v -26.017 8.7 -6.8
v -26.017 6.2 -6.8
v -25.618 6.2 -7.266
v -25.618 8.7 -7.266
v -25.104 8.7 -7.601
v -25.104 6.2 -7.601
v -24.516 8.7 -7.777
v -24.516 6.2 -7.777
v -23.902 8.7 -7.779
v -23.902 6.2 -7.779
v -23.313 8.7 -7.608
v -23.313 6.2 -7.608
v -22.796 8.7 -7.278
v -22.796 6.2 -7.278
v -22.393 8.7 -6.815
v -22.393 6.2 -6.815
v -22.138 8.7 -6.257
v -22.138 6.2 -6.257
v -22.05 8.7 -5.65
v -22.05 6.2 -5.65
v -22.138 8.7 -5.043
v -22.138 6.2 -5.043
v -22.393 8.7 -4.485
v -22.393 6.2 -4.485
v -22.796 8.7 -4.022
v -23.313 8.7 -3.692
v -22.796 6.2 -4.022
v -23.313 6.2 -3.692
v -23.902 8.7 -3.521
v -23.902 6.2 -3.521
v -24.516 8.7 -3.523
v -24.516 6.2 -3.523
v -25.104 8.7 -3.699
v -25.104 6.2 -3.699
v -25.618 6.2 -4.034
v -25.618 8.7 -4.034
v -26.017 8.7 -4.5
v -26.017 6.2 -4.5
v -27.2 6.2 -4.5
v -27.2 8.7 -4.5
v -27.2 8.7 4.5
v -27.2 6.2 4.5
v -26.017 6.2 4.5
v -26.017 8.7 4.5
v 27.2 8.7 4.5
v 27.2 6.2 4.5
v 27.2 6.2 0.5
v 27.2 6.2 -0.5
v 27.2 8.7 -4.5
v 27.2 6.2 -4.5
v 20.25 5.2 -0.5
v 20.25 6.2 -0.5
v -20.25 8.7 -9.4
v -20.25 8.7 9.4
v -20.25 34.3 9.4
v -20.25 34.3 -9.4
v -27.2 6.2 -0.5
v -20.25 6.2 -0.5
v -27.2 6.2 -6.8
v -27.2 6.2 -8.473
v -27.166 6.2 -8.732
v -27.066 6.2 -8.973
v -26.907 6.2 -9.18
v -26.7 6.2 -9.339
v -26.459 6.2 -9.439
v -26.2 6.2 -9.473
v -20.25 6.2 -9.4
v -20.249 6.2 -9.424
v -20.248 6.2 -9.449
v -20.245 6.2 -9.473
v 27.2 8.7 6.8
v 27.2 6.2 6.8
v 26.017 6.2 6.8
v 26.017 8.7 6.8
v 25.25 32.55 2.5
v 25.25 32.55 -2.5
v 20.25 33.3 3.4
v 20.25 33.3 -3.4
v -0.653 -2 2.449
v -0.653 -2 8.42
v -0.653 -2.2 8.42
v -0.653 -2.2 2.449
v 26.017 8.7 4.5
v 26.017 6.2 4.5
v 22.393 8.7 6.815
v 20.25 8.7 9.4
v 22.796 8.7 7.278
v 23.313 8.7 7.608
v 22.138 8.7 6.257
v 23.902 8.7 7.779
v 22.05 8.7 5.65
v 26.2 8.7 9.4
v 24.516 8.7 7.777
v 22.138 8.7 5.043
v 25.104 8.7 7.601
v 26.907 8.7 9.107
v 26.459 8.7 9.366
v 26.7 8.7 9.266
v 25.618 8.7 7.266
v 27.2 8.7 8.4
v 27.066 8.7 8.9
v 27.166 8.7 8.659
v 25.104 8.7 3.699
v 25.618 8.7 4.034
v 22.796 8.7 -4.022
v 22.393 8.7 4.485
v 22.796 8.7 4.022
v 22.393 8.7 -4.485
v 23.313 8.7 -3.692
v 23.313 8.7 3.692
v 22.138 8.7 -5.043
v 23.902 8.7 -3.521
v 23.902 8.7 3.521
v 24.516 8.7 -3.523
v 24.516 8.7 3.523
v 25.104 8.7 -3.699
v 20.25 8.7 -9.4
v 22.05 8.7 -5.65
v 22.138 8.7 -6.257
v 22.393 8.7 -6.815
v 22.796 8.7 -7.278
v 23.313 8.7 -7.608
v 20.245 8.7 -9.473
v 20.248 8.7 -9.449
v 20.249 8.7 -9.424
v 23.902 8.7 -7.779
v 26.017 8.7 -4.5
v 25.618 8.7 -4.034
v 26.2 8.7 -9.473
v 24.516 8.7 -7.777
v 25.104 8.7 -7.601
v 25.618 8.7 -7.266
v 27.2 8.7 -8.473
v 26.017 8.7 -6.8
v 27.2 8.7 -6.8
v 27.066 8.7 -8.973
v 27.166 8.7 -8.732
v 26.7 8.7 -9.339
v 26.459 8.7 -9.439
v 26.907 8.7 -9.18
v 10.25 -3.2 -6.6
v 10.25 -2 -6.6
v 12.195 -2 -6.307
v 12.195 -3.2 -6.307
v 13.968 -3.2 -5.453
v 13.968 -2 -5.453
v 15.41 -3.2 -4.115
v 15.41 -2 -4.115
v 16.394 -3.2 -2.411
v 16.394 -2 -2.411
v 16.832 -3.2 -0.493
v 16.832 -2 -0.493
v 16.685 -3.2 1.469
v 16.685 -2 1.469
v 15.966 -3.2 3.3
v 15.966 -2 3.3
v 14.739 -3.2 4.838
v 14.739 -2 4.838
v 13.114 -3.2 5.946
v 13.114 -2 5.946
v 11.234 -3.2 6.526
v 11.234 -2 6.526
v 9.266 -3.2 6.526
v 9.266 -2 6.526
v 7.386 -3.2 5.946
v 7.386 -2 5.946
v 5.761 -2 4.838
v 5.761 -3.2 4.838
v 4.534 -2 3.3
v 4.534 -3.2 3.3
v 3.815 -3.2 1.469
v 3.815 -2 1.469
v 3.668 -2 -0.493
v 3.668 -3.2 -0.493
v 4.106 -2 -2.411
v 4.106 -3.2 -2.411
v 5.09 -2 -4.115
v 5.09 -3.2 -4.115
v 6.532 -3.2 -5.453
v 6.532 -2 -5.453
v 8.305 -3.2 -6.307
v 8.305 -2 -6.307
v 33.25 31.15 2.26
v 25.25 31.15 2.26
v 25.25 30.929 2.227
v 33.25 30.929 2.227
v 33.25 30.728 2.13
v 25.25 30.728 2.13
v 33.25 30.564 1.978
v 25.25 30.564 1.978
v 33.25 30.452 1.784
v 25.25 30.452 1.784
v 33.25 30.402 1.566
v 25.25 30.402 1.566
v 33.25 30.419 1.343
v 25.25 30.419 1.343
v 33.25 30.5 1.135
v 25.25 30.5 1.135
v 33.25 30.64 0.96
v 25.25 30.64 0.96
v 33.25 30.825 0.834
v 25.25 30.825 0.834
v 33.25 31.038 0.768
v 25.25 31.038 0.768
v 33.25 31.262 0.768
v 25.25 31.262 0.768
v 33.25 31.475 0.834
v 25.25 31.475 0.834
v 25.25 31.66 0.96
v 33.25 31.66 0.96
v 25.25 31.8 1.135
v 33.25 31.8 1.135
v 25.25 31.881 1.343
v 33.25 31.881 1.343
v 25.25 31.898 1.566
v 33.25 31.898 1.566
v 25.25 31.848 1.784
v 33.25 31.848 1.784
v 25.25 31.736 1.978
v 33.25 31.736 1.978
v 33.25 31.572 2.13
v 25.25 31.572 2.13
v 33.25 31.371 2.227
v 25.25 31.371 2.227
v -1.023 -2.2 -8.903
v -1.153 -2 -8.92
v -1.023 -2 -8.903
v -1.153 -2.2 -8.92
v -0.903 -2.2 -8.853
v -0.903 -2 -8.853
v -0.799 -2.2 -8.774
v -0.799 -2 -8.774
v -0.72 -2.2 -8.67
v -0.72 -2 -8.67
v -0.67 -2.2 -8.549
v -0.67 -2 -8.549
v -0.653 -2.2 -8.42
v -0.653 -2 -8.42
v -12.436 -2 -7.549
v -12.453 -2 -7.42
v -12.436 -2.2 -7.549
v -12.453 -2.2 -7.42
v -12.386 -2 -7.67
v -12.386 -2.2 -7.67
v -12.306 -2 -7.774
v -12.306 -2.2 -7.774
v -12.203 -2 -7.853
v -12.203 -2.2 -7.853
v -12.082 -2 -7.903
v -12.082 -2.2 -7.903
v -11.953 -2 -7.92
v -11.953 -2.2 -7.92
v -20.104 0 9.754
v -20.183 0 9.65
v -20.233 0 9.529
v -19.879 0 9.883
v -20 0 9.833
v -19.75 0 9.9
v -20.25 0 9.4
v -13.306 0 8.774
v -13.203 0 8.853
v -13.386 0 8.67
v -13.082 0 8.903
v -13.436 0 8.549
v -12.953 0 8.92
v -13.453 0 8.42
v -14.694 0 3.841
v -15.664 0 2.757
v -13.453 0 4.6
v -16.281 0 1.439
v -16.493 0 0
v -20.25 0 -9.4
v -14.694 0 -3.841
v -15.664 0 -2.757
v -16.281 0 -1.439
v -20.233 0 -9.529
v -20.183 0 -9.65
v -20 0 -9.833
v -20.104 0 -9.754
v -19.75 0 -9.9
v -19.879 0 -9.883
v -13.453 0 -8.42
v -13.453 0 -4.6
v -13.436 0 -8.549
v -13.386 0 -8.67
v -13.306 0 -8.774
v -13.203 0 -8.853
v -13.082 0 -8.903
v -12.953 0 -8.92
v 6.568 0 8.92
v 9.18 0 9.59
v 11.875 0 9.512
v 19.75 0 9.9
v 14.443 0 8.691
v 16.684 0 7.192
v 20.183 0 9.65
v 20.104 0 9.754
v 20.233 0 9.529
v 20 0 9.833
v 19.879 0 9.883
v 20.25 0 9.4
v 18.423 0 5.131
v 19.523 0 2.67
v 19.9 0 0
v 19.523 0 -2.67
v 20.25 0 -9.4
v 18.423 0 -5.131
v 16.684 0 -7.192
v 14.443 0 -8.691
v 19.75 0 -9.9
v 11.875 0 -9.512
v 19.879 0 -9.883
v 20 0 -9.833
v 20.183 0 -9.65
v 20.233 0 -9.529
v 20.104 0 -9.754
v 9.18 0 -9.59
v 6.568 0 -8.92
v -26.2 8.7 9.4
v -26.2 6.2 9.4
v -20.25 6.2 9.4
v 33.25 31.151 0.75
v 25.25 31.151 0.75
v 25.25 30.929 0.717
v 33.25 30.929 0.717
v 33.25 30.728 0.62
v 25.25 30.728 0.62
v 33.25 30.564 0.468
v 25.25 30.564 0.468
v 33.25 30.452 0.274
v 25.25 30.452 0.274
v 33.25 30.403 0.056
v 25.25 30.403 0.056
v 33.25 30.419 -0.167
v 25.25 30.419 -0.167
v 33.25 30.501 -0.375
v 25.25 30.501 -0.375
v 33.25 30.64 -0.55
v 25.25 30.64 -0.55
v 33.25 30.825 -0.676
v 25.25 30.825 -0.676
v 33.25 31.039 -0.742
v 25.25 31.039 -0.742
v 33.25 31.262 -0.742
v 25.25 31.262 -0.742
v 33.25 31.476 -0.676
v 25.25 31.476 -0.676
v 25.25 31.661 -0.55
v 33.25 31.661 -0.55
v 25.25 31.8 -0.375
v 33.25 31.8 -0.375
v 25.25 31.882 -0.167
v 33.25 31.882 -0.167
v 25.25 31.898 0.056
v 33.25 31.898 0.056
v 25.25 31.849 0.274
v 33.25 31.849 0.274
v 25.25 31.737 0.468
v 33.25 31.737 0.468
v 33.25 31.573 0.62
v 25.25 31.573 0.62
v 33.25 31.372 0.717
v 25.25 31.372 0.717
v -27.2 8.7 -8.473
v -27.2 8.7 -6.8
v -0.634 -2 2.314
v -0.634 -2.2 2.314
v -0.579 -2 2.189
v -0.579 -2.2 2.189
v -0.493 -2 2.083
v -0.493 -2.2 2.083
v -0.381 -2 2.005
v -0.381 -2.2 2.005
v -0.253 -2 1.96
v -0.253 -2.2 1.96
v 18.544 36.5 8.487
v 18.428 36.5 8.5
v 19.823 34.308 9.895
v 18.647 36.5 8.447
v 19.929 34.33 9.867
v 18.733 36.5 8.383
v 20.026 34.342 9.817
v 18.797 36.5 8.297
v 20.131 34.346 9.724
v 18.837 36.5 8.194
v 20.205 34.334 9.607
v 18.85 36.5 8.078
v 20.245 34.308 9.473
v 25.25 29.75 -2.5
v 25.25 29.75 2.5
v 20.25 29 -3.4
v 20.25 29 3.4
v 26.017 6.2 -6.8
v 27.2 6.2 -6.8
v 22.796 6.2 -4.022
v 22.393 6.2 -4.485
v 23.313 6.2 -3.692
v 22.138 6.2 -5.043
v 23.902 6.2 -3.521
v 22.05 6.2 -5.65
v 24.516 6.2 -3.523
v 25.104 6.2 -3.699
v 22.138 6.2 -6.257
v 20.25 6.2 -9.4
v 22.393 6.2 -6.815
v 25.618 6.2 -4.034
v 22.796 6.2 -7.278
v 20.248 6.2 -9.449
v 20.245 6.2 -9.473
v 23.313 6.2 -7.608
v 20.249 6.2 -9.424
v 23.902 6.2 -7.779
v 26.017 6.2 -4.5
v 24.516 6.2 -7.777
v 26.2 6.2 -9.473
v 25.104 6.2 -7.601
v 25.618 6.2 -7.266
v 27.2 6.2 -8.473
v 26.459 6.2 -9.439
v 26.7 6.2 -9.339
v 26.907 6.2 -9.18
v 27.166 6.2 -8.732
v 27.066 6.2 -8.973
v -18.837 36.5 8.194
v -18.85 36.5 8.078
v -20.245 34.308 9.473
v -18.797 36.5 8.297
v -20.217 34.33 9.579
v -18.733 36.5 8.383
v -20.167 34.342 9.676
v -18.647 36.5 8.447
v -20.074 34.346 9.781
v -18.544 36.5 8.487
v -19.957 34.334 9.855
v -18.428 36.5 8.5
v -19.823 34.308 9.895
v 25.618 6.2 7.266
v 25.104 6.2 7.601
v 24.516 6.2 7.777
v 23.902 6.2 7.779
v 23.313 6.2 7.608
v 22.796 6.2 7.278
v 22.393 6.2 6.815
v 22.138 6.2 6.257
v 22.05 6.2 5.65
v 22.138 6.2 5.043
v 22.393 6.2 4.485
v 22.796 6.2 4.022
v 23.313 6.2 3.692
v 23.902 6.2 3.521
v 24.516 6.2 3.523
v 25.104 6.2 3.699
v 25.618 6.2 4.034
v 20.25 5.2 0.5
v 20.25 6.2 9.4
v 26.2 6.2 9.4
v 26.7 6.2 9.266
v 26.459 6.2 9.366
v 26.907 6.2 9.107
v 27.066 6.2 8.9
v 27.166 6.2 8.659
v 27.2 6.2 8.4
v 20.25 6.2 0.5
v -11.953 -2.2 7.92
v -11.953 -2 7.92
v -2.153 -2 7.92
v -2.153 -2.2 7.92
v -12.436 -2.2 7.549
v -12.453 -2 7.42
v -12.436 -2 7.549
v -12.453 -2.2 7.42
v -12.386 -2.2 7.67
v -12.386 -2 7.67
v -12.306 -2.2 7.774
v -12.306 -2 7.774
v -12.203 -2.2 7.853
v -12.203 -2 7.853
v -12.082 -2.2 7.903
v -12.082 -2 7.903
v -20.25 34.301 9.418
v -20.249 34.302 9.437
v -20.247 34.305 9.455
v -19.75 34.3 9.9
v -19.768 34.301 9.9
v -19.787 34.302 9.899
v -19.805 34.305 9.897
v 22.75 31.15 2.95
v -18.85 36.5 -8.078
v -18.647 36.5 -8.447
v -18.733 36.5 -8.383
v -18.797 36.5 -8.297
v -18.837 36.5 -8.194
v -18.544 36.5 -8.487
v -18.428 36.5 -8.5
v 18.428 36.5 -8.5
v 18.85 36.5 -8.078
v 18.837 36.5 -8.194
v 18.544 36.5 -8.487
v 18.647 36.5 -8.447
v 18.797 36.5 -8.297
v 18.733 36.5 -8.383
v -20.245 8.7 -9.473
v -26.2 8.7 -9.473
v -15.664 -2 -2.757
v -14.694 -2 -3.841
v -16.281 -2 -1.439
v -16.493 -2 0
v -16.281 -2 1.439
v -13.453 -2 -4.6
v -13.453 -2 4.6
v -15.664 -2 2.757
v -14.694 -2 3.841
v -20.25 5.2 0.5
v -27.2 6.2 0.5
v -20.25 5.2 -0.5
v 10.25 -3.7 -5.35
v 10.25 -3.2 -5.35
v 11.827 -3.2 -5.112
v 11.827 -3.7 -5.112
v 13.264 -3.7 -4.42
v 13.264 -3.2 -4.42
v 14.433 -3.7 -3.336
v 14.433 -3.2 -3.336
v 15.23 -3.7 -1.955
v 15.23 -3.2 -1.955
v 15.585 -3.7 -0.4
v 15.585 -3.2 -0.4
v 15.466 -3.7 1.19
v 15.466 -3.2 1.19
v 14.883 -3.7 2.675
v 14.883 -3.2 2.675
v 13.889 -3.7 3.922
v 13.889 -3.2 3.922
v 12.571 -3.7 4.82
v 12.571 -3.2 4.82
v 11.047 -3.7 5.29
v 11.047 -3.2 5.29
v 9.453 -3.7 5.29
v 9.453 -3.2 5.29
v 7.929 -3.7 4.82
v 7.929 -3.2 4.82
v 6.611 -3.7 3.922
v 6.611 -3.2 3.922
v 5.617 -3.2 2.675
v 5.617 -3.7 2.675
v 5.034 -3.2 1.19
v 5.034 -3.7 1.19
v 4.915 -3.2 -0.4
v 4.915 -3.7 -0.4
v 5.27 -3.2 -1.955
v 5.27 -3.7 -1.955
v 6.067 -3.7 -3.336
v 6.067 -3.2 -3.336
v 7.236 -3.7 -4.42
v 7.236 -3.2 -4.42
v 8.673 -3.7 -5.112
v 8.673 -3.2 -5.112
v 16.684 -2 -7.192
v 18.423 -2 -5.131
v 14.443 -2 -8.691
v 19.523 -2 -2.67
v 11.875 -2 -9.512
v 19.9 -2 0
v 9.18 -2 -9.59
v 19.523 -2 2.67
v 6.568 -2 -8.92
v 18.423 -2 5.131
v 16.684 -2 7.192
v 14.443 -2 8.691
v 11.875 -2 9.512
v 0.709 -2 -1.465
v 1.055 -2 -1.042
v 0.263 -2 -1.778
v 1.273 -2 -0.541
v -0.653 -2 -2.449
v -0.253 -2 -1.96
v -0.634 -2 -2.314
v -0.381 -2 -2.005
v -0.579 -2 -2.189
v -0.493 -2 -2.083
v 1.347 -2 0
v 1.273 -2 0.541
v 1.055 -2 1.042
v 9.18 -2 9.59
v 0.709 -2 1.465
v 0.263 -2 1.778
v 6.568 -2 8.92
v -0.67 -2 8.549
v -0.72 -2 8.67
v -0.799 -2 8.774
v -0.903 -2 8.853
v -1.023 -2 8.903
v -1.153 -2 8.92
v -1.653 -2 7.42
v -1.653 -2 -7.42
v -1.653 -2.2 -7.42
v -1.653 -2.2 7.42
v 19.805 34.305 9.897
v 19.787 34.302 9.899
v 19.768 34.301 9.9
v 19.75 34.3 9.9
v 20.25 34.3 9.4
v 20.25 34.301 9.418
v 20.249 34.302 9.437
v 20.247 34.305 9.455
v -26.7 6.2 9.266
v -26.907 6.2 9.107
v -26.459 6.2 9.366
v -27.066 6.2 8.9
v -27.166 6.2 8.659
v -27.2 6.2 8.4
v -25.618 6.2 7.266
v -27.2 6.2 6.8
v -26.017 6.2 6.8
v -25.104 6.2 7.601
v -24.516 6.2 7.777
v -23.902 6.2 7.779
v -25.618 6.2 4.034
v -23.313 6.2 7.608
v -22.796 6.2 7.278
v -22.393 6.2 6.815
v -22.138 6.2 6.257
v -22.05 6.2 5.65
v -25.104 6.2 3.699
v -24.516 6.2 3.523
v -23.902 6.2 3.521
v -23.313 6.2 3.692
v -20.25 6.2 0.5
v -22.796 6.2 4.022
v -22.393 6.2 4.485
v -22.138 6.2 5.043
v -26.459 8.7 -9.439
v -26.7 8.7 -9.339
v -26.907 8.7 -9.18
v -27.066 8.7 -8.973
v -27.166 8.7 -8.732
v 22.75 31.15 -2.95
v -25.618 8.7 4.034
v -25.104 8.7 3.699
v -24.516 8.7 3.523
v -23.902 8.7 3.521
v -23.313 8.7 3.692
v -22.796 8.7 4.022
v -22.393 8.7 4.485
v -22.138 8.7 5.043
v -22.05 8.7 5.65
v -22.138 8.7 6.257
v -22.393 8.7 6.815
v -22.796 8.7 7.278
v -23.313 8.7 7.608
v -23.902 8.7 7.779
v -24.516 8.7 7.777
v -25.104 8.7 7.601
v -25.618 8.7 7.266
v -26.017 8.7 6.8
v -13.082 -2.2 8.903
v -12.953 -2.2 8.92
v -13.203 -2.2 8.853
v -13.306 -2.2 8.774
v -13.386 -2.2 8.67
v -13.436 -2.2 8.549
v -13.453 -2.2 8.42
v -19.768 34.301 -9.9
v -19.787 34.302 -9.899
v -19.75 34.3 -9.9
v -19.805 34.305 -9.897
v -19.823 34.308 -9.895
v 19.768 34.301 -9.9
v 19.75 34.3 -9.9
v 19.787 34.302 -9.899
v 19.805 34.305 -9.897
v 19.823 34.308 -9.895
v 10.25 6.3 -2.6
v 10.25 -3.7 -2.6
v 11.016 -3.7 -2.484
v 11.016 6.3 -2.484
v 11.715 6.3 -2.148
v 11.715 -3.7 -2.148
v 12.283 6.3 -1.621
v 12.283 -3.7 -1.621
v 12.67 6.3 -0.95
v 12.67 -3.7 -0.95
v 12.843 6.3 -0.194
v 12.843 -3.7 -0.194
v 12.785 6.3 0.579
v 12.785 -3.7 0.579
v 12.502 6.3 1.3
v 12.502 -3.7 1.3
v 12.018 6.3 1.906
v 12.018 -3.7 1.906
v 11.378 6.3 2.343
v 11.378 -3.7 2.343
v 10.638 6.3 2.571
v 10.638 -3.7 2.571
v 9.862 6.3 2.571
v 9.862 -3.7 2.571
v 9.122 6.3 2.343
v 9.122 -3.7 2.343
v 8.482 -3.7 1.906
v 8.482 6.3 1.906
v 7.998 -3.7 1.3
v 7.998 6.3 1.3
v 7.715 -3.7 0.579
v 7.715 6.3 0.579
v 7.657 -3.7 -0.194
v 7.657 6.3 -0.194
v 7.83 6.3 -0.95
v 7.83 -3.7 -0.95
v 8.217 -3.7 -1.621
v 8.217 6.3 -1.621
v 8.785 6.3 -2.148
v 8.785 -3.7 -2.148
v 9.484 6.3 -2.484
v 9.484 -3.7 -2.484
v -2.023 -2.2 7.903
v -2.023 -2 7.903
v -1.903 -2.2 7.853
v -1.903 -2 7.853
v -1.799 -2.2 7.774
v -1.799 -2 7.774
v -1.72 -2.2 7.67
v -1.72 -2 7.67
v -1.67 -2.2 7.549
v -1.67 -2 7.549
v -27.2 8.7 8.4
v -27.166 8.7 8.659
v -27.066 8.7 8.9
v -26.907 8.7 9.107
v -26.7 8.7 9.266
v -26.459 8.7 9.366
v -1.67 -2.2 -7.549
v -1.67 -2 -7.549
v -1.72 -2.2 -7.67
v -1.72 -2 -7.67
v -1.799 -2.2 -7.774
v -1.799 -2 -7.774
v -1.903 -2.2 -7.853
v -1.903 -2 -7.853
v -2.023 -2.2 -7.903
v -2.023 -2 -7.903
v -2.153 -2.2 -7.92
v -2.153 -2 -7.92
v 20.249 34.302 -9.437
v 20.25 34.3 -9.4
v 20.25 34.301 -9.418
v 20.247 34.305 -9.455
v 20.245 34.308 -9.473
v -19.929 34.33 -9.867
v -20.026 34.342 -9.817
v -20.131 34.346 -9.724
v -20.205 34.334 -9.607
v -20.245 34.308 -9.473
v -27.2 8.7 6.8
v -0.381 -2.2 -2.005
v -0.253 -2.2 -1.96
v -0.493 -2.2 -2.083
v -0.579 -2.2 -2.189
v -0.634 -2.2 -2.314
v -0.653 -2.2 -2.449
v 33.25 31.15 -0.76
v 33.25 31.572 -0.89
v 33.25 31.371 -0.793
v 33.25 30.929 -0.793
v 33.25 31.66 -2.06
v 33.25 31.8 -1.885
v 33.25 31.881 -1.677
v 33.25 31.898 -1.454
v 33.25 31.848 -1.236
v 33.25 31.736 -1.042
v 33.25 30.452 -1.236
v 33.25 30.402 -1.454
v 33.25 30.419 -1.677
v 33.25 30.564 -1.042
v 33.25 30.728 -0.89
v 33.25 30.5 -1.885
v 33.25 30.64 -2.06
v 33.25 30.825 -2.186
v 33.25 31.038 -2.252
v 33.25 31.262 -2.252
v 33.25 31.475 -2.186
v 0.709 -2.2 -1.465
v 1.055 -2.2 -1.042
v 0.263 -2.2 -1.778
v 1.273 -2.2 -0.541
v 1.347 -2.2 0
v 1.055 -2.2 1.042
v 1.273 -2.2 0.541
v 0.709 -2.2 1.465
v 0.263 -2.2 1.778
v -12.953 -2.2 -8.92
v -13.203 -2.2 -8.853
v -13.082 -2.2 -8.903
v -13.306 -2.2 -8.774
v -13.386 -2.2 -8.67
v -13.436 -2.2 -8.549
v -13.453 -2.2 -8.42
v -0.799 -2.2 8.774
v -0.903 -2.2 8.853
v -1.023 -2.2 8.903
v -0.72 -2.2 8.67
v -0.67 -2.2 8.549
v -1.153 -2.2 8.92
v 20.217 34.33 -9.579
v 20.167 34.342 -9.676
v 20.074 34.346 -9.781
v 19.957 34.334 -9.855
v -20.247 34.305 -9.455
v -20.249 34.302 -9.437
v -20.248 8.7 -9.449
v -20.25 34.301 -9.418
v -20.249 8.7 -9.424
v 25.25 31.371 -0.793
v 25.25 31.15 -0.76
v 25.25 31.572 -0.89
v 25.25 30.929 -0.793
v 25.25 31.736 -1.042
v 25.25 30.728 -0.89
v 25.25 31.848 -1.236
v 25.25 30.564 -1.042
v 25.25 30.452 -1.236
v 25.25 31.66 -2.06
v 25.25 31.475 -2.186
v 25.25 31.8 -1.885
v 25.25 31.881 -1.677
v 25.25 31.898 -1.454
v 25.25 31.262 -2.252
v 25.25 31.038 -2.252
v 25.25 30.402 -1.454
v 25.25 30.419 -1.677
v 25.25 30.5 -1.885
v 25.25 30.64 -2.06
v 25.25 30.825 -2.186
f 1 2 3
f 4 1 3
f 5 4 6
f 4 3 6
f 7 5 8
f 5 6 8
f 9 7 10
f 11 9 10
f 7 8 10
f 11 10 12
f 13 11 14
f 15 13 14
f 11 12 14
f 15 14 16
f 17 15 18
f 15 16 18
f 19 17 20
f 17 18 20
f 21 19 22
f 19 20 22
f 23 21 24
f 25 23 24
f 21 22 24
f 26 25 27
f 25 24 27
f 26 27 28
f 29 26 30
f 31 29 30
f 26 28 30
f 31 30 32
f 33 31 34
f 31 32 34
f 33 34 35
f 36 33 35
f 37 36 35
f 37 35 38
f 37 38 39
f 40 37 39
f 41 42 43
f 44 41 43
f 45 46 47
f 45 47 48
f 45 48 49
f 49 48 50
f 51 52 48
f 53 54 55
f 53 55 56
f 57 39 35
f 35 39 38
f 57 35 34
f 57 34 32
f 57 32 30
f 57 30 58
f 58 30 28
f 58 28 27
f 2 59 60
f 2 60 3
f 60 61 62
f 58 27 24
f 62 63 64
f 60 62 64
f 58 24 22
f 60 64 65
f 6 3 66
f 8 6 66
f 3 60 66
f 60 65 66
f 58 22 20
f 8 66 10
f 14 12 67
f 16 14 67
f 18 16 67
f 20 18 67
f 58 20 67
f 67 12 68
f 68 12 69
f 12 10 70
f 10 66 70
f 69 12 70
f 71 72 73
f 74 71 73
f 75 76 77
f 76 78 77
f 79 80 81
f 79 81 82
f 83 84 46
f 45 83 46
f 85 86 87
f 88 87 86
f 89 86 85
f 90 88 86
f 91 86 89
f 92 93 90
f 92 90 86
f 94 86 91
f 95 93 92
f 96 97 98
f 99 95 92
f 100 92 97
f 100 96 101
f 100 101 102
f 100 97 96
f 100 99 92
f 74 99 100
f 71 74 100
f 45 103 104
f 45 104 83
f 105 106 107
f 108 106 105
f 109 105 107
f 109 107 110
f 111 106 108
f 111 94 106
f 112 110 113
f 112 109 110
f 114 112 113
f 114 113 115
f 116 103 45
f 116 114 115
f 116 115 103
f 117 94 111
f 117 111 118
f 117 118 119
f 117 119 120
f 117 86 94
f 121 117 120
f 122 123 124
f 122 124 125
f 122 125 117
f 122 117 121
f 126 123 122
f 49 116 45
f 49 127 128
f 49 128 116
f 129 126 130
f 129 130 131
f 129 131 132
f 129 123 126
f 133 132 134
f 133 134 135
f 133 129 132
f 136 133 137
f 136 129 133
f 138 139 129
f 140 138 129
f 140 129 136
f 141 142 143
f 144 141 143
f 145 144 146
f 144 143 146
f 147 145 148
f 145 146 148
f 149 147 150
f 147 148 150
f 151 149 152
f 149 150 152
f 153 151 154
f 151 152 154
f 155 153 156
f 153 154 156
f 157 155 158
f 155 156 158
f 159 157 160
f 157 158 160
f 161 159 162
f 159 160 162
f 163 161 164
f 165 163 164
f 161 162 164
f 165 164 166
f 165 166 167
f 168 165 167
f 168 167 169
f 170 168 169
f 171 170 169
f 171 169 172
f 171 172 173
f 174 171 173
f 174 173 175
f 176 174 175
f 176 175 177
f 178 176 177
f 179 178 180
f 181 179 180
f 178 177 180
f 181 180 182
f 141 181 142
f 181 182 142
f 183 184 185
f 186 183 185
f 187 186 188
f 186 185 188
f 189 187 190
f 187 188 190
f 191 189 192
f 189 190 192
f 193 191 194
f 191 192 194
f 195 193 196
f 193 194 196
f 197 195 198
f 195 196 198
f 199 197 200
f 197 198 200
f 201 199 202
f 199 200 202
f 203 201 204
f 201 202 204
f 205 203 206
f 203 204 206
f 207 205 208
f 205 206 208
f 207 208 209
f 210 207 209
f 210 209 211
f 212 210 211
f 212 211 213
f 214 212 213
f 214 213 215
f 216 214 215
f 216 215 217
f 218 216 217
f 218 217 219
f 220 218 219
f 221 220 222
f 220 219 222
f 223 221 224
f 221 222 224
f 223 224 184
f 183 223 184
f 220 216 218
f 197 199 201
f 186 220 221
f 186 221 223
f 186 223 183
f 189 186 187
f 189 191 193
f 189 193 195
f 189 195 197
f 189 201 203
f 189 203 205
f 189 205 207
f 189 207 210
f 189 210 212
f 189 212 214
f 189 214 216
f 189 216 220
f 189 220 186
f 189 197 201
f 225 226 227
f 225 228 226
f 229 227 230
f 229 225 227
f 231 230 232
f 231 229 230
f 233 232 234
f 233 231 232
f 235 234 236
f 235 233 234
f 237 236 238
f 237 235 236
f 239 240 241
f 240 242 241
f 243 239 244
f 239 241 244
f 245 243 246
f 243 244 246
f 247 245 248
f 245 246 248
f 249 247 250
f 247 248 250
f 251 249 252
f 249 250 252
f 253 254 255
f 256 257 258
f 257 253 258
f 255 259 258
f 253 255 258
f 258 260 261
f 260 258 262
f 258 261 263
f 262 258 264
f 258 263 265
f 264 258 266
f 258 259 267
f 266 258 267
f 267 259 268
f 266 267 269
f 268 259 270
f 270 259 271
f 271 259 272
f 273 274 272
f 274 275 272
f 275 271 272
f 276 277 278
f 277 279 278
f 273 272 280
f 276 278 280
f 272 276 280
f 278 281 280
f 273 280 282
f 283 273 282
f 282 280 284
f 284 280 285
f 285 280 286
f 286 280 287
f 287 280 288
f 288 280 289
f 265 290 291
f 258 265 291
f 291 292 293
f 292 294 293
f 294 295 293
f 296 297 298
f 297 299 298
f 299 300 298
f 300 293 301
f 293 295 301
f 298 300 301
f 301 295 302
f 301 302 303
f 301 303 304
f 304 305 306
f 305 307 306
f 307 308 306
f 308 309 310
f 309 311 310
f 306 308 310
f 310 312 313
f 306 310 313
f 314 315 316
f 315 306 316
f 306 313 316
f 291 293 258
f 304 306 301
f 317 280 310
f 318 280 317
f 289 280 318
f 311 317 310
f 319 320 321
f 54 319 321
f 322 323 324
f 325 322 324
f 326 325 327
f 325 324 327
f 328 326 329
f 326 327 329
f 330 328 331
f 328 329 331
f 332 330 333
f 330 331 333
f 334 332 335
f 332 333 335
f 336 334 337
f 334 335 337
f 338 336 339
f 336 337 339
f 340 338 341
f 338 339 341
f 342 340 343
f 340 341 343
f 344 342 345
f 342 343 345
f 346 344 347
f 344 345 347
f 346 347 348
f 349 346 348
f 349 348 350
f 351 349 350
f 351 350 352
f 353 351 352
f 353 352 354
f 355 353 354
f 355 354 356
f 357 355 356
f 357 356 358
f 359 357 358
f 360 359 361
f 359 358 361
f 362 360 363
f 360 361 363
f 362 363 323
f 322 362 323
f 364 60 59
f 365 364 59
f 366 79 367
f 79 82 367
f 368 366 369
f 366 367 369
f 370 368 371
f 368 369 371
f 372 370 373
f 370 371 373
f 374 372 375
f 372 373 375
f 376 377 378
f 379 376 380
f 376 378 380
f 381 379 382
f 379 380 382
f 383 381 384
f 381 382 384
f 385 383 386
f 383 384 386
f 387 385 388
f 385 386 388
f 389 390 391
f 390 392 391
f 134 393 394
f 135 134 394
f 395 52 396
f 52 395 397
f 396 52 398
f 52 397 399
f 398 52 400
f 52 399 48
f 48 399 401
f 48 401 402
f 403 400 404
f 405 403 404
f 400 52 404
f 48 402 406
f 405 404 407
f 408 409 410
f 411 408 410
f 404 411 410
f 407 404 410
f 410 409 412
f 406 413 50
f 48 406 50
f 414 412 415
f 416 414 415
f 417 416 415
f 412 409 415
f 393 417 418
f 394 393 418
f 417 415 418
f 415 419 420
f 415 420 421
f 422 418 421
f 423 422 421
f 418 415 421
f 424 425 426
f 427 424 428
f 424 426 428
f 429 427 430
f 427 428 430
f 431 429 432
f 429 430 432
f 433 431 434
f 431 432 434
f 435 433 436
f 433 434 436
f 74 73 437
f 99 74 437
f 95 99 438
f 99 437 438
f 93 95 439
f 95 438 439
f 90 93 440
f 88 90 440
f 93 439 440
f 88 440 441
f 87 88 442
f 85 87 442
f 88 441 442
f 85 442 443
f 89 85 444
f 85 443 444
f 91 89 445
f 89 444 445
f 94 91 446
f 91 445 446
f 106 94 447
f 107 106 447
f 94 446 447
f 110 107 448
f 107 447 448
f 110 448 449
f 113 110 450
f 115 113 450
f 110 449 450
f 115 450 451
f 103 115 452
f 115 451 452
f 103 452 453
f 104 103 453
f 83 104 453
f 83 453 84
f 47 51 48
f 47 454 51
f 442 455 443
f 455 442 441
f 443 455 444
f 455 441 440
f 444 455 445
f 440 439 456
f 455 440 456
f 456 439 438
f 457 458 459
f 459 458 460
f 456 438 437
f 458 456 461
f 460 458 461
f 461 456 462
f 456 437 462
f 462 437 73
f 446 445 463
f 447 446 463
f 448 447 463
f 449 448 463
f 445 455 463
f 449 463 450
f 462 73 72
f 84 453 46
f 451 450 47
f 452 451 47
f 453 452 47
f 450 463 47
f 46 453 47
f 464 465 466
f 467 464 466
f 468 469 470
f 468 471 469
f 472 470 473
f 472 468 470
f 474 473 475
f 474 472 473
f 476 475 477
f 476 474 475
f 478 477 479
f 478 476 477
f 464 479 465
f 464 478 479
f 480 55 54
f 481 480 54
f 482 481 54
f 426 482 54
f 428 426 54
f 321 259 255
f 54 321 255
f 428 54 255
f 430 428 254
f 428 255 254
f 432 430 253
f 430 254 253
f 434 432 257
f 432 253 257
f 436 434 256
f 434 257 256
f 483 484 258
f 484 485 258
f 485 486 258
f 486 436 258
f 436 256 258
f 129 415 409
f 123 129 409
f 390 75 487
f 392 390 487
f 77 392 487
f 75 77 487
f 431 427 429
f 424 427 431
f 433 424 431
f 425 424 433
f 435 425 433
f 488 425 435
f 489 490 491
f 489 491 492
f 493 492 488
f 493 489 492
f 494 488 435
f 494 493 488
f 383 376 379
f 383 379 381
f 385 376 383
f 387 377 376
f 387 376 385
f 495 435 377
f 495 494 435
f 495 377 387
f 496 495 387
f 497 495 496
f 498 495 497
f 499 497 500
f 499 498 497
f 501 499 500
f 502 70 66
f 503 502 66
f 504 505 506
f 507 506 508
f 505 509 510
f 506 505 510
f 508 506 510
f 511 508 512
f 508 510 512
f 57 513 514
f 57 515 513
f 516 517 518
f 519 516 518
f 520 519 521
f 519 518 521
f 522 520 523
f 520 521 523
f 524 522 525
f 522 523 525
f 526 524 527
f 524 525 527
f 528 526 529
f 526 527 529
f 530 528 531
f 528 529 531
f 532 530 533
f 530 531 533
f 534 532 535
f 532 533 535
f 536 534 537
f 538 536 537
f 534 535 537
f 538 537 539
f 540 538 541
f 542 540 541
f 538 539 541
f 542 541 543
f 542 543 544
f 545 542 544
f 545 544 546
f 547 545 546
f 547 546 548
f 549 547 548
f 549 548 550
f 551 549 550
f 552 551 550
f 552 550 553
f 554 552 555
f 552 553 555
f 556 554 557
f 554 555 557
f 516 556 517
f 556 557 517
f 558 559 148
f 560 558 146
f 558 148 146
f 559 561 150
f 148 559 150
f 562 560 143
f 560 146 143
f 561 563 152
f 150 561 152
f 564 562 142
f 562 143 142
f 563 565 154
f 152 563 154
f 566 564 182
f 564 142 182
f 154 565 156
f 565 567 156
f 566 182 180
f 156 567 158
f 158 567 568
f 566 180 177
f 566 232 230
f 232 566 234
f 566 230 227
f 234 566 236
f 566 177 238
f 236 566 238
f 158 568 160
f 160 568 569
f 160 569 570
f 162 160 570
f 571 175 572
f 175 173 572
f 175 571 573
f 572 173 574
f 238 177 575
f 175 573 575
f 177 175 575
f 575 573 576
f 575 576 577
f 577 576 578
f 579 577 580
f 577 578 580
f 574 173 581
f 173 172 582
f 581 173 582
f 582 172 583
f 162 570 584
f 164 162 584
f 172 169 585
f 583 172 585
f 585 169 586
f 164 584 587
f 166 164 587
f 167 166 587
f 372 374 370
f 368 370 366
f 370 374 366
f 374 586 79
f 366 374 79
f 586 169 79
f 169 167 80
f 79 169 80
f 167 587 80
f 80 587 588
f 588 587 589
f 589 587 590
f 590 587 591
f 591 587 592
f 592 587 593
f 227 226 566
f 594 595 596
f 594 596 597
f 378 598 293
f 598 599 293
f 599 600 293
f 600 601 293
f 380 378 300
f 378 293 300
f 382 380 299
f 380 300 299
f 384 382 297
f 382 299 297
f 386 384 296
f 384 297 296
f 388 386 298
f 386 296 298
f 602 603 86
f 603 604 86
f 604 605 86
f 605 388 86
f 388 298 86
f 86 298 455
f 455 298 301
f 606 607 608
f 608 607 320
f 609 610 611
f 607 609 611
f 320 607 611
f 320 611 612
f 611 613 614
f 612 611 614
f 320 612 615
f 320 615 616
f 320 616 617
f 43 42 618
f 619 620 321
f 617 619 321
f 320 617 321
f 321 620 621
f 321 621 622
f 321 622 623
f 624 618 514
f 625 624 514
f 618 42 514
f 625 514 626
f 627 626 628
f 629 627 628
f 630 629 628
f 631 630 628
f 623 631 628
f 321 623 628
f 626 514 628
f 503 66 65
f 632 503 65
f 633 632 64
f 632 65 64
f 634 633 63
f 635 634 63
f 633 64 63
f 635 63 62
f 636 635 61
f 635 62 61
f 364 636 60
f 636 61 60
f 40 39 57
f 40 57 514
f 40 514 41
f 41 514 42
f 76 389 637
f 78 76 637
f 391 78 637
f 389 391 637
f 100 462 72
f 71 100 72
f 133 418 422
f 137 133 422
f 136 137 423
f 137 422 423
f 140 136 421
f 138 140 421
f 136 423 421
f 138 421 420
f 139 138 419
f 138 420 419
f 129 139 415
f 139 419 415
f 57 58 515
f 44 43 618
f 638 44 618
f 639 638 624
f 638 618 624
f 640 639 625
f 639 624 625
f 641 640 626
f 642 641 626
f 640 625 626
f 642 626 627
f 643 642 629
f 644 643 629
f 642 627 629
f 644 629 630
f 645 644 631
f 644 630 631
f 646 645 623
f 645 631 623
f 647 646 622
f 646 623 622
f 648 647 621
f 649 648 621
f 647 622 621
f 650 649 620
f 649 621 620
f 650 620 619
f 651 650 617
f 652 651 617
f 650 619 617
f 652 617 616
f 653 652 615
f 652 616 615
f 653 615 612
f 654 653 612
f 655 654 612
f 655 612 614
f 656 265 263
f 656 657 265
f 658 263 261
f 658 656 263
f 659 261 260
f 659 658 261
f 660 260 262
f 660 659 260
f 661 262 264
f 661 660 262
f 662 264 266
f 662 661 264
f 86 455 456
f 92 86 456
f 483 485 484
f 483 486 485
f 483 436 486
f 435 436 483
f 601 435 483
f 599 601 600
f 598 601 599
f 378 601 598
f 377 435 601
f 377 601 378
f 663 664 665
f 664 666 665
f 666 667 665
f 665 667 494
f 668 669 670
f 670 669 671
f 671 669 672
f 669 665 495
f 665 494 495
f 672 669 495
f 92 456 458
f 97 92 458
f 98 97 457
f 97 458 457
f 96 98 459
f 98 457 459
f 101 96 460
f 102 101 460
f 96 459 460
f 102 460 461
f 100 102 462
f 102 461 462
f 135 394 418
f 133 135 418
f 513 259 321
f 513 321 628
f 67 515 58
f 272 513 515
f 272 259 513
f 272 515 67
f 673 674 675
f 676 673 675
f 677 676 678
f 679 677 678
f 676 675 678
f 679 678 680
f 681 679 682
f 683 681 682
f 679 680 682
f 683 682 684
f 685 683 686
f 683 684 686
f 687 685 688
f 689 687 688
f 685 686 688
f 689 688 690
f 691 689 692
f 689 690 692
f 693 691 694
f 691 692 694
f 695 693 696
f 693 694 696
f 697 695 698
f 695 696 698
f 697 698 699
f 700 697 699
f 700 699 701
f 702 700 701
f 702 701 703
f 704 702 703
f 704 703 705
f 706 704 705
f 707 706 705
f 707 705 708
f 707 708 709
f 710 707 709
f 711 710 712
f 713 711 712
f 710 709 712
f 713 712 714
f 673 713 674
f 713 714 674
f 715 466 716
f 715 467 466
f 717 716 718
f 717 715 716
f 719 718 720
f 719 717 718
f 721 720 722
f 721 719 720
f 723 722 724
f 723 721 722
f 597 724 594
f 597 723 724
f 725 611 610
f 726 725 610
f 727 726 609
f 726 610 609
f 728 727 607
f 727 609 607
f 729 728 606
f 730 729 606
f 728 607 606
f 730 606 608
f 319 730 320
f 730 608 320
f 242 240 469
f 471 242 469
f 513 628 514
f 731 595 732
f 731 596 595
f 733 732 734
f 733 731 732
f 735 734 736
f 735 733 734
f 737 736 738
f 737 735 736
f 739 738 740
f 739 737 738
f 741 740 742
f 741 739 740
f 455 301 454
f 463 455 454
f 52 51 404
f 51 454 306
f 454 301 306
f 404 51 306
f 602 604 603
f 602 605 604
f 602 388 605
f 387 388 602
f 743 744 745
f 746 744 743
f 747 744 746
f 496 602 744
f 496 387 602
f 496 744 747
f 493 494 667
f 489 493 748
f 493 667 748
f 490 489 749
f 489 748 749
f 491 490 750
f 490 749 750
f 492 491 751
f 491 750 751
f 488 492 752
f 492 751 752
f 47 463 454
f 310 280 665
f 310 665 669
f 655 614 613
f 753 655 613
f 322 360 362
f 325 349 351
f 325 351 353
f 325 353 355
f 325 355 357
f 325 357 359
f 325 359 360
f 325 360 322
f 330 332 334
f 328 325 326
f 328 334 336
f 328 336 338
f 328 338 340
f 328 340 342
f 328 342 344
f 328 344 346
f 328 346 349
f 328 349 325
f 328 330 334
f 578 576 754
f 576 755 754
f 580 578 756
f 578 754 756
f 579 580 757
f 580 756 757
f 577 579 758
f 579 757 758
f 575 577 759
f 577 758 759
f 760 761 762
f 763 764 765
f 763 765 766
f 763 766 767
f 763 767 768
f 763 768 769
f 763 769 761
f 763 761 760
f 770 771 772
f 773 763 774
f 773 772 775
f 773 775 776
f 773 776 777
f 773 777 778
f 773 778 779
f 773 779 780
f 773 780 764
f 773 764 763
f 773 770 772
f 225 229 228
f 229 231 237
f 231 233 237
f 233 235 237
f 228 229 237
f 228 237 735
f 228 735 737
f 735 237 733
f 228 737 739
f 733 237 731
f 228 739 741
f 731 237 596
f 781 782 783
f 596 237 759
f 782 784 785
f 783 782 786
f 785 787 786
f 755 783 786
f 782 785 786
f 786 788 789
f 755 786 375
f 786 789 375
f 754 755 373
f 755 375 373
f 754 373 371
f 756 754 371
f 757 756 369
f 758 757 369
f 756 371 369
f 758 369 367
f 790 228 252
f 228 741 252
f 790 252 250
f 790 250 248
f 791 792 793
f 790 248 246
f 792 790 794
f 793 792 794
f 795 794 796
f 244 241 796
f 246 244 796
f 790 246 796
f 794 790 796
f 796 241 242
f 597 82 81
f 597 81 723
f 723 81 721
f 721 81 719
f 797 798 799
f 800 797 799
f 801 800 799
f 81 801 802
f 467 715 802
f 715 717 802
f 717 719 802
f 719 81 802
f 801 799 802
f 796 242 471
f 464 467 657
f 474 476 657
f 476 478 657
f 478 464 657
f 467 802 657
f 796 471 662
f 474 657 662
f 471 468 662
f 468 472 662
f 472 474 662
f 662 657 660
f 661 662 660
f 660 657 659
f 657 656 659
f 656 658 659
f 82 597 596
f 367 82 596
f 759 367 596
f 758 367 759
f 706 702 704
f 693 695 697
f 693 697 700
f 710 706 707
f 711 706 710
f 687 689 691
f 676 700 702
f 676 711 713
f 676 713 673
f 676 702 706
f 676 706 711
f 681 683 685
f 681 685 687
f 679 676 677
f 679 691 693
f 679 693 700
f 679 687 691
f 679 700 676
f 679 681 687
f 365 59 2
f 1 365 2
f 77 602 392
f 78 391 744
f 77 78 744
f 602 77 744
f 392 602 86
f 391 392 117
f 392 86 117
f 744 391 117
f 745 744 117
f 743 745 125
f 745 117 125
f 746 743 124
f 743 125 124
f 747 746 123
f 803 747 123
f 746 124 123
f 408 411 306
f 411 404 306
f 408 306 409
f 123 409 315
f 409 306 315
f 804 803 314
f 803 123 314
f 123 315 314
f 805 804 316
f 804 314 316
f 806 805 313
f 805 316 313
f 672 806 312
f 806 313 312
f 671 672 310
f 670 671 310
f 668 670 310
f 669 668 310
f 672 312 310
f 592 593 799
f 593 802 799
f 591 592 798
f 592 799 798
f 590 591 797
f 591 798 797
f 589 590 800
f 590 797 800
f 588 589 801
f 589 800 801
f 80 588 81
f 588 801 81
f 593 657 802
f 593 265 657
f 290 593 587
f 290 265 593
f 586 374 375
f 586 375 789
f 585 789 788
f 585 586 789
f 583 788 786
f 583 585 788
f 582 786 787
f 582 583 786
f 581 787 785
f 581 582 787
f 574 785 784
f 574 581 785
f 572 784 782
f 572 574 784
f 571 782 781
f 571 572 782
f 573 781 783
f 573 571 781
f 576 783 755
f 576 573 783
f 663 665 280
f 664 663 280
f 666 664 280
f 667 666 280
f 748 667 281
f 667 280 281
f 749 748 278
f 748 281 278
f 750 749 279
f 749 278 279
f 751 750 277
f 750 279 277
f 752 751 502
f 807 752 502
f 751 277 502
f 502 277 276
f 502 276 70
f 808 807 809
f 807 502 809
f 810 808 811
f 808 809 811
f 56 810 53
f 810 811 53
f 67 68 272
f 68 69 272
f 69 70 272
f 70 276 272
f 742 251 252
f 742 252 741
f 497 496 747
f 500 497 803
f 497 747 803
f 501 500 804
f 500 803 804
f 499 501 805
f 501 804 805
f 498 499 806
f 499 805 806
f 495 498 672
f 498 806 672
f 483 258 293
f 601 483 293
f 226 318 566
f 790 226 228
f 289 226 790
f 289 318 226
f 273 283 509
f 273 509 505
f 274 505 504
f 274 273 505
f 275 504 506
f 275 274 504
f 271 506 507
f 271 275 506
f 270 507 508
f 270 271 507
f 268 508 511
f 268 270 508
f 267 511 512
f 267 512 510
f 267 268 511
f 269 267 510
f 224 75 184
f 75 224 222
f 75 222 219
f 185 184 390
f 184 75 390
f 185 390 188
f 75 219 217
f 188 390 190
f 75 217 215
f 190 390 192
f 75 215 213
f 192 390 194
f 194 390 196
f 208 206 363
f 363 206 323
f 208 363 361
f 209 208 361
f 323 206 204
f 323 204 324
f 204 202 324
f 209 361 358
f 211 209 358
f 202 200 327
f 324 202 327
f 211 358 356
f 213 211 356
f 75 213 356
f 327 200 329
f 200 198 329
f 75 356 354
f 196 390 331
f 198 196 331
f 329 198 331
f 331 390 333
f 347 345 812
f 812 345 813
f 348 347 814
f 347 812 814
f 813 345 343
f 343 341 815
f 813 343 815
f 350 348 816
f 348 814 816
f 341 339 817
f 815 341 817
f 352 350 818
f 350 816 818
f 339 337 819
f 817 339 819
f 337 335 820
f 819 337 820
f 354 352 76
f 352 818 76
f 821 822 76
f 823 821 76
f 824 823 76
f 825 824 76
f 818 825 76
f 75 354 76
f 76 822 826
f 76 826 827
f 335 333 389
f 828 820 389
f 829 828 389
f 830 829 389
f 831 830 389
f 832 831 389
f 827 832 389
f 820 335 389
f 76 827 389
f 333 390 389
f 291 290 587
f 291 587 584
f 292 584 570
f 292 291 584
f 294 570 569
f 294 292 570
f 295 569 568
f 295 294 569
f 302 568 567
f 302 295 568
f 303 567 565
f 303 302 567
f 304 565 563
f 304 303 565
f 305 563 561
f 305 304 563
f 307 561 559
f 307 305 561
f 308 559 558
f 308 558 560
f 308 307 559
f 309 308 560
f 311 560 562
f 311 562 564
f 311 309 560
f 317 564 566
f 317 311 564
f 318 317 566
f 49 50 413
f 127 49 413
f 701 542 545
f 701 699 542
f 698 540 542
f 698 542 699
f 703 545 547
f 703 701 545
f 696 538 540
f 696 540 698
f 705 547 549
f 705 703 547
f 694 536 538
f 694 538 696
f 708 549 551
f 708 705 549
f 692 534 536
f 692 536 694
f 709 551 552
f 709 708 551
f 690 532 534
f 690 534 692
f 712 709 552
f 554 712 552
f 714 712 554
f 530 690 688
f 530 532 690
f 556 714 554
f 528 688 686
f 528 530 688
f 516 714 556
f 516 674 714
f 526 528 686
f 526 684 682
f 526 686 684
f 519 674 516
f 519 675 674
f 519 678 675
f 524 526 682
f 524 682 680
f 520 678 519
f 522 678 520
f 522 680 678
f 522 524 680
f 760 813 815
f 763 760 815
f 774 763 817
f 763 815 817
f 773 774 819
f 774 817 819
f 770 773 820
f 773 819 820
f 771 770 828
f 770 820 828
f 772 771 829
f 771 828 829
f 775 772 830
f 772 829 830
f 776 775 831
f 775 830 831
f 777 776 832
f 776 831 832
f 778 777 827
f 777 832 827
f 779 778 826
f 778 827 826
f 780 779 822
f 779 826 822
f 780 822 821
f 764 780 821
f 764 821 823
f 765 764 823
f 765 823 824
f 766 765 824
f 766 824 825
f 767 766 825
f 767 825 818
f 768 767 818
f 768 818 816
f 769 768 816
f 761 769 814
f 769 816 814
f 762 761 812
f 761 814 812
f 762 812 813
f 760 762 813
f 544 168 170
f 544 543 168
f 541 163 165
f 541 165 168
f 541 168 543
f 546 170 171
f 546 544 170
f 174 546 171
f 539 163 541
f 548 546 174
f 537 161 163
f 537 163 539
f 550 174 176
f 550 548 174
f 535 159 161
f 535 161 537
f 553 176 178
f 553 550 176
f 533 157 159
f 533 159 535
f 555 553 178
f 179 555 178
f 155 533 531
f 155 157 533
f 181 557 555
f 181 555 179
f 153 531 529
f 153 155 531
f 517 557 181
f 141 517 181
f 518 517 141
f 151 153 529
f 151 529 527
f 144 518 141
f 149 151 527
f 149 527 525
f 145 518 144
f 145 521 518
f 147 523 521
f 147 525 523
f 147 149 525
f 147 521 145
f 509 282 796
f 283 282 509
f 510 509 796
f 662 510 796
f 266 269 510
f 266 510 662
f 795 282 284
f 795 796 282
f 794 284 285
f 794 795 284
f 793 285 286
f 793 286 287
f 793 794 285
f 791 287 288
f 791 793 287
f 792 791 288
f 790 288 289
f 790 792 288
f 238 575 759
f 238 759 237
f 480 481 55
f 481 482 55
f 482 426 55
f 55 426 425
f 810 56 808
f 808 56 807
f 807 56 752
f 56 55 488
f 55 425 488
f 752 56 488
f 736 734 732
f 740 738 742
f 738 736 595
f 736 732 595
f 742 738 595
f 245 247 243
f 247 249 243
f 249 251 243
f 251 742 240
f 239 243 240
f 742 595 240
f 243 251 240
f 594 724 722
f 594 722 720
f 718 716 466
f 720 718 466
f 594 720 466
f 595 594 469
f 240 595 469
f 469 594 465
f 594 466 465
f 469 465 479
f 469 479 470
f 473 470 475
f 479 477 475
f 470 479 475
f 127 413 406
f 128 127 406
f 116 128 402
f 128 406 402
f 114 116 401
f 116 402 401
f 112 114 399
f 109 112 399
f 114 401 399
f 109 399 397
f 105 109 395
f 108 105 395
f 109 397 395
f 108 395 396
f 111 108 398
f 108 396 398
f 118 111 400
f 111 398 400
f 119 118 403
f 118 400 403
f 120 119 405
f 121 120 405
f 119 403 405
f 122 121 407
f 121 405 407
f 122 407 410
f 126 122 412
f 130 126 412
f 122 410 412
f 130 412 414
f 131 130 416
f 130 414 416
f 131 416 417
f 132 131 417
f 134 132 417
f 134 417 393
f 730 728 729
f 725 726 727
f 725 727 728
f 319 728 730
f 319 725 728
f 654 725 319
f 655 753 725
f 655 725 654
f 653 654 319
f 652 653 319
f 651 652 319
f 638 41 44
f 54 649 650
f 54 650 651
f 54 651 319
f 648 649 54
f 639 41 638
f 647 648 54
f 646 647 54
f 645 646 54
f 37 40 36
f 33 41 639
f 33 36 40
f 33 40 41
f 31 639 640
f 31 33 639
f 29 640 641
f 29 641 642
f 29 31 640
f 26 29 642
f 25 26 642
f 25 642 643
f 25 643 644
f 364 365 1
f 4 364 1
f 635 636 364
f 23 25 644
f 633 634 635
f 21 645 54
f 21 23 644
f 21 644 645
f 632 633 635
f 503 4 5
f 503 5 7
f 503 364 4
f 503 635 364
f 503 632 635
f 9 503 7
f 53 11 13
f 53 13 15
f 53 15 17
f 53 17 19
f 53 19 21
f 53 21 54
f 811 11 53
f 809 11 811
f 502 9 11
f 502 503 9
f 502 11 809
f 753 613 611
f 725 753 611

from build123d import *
from OCP.BRepFilletAPI import BRepFilletAPI_MakeChamfer

# Parameters (mm, degrees)
SKETCH_1_W       = 40.5
SKETCH_1_H       = 19.8
BODY_DEPTH       = 36.5
CHAMFER_1_SIZE   = 2.2
CHAMFER_1_SIZE2  = 1.4
FILLET_1_R       = 0.5
MOUNT_DEPTH      = 2.5
EXTRUDE_3_DEPTH  = 0.5
EXTRUDE_4_DEPTH  = 2
SKETCH_5_W       = 10.8
SKETCH_5_H       = 15.84
EXTRUDE_5_DEPTH  = 0.2
SKETCH_6_R       = 6.6
EXTRUDE_6_DEPTH  = 1.2
SKETCH_7_R       = 5.35
EXTRUDE_7_DEPTH  = 0.5
SKETCH_8_R       = 2.6
SHAFT_HOLE_DEPTH = 10
FILLET_2_R       = 0.5
SKETCH_11_R      = 0.75
EXTRUDE_10_DEPTH = 8


with BuildPart() as part:
    # Эскиз1 → Body (new body)
    with BuildSketch(Plane(origin=(0, 0, 0), x_dir=(1, 0, 0), z_dir=(0, 1, 0))):
        Rectangle(SKETCH_1_W, SKETCH_1_H)
    extrude(amount=BODY_DEPTH)

    # Фаска1: one chamfer whose edges measure the first distance from different faces: ONE call of the kernel's chamfer builder (chamfer() names one face for all edges)
    chamfer_1_edges_1 = [part.edges().sort_by_distance(p)[0] for p in [
        (20.25, 36.5, 0),
    ]]
    chamfer_1_side_1 = [part.faces().sort_by_distance(p)[0] for p in [
        (20.25, 18.25, 0),
    ]]
    chamfer_1_edges_2 = [part.edges().sort_by_distance(p)[0] for p in [
        (0, 36.5, -9.9),
    ]]
    chamfer_1_side_2 = [part.faces().sort_by_distance(p)[0] for p in [
        (0, 18.25, -9.9),
    ]]
    chamfer_1_edges_3 = [part.edges().sort_by_distance(p)[0] for p in [
        (-20.25, 36.5, 0),
    ]]
    chamfer_1_side_3 = [part.faces().sort_by_distance(p)[0] for p in [
        (-20.25, 18.25, 0),
    ]]
    chamfer_1_edges_4 = [part.edges().sort_by_distance(p)[0] for p in [
        (0, 36.5, 9.9),
    ]]
    chamfer_1_side_4 = [part.faces().sort_by_distance(p)[0] for p in [
        (0, 18.25, 9.9),
    ]]
    chamfer_1 = BRepFilletAPI_MakeChamfer(part.part.solid().wrapped)
    for e in chamfer_1_edges_1:
        chamfer_1.Add(CHAMFER_1_SIZE, CHAMFER_1_SIZE2, e.wrapped, chamfer_1_side_1[0].wrapped)  # the first distance lies on this face
    for e in chamfer_1_edges_2:
        chamfer_1.Add(CHAMFER_1_SIZE, CHAMFER_1_SIZE2, e.wrapped, chamfer_1_side_2[0].wrapped)  # the first distance lies on this face
    for e in chamfer_1_edges_3:
        chamfer_1.Add(CHAMFER_1_SIZE, CHAMFER_1_SIZE2, e.wrapped, chamfer_1_side_3[0].wrapped)  # the first distance lies on this face
    for e in chamfer_1_edges_4:
        chamfer_1.Add(CHAMFER_1_SIZE, CHAMFER_1_SIZE2, e.wrapped, chamfer_1_side_4[0].wrapped)  # the first distance lies on this face
    add(Compound.cast(chamfer_1.Shape()), mode=Mode.REPLACE)

    # Скругление1
    # the kernel refuses this fillet: 0.5 mm, written as the material it takes off along each edge
    with BuildSketch(Plane(origin=(-20.25, -1.25, 9.9), x_dir=(1, 0, 0), z_dir=(0, 1, 0)), Plane(origin=(-20.25, -1.25, -9.9), x_dir=(0, 0, 1), z_dir=(0, 1, 0))) as fillet_1_piece_1:
        with BuildLine():
            CenterArc((FILLET_1_R, FILLET_1_R), FILLET_1_R, 180, 90)
            Line((0, FILLET_1_R), (0, 0))
            Line((0, 0), (FILLET_1_R, 0))
        make_face()
    extrude(amount=36.8, mode=Mode.SUBTRACT)
    with BuildSketch(Plane(origin=(20.25, -1.25, -9.9), x_dir=(0, 0, 1), z_dir=(0, 1, 0)), Plane(origin=(20.25, -1.25, 9.9), x_dir=(-1, 0, 0), z_dir=(0, 1, 0))) as fillet_1_piece_2:
        with BuildLine():
            CenterArc((FILLET_1_R, -FILLET_1_R), FILLET_1_R, 90, 90)
            Line((0, -FILLET_1_R), (0, 0))
            Line((0, 0), (FILLET_1_R, 0))
        make_face()
    extrude(amount=36.8, mode=Mode.SUBTRACT)
    with BuildSketch(Plane(origin=(20.689497717, 33.609360731, -10.339497717), x_dir=(0.25395078633508533, -0.3990655213836877, 0.8810537485094523), z_dir=(-0.47301616487963943, 0.7433111162394352, 0.47301616487964004)), Plane(origin=(20.689497717, 33.609360731, 10.339497717), x_dir=(-0.8810537485094526, -0.39906552138369156, 0.25395078633507817), z_dir=(-0.47301616487963943, 0.7433111162394352, -0.47301616487964004))) as fillet_1_piece_3:
        with BuildLine():
            CenterArc((FILLET_1_R * 0.743311116239, -FILLET_1_R), FILLET_1_R, 90, 73.247664886)
            Line((-FILLET_1_R * 0.21424849821, -FILLET_1_R * 0.711764705882), (0, 0))
            Line((0, 0), (FILLET_1_R * 0.743311116239, 0))
        make_face()
    extrude(amount=4.818007508, mode=Mode.SUBTRACT)
    with BuildSketch(Plane(origin=(-20.689497717, 33.609360731, -10.339497717), x_dir=(-0.25395078633507856, -0.3990655213836921, 0.8810537485094524), z_dir=(0.47301616487963943, 0.7433111162394352, 0.47301616487964004)), Plane(origin=(-20.689497717, 33.609360731, 10.339497717), x_dir=(0.8810537485094527, -0.3990655213836916, 0.25395078633507817), z_dir=(0.47301616487963943, 0.7433111162394352, -0.47301616487964004))) as fillet_1_piece_4:
        with BuildLine():
            CenterArc((FILLET_1_R * 0.743311116239, FILLET_1_R), FILLET_1_R, 196.752335114, 73.247664886)
            Line((-FILLET_1_R * 0.21424849821, FILLET_1_R * 0.711764705882), (0, 0))
            Line((0, 0), (FILLET_1_R * 0.743311116239, 0))
        make_face()
    extrude(amount=4.818007508, mode=Mode.SUBTRACT)

    # Эскиз2 → Mount (add)
    with BuildSketch(Plane(origin=(0, 6.2, 0), x_dir=(-1, 0, 0), z_dir=(0, -1, 0))):
        with BuildLine():
            Line((-26.2, 9.472835762), (26.2, 9.472835762))
            ThreePointArc((26.2, 9.472835762), (26.907106781, 9.179942543), (27.2, 8.472835762))
            Line((27.2, 8.472835762), (27.2, 6.8))
            Line((27.2, 6.8), (26.016590212, 6.8))
            ThreePointArc((26.016590212, 6.8), (22.05, 5.65), (26.016590212, 4.5))
            Line((26.016590212, 4.5), (27.2, 4.5))
            Line((27.2, 4.5), (27.2, -4.5))
            Line((27.2, -4.5), (26.016590212, -4.5))
            ThreePointArc((26.016590212, -4.5), (22.05, -5.65), (26.016590212, -6.8))
            Line((26.016590212, -6.8), (27.2, -6.8))
            Line((27.2, -6.8), (27.2, -8.4))
            ThreePointArc((27.2, -8.4), (26.907106781, -9.107106781), (26.2, -9.4))
            Line((26.2, -9.4), (-26.2, -9.4))
            ThreePointArc((-26.2, -9.4), (-26.907106781, -9.107106781), (-27.2, -8.4))
            Line((-27.2, -8.4), (-27.2, -6.8))
            Line((-27.2, -6.8), (-26.016590212, -6.8))
            ThreePointArc((-26.016590212, -6.8), (-22.05, -5.65), (-26.016590212, -4.5))
            Line((-26.016590212, -4.5), (-27.2, -4.5))
            Line((-27.2, -4.5), (-27.2, 4.5))
            Line((-27.2, 4.5), (-26.016590212, 4.5))
            ThreePointArc((-26.016590212, 4.5), (-22.05, 5.65), (-26.016590212, 6.8))
            Line((-26.016590212, 6.8), (-27.2, 6.8))
            Line((-27.2, 6.8), (-27.2, 8.472835762))
            ThreePointArc((-27.2, 8.472835762), (-26.907106781, 9.179942543), (-26.2, 9.472835762))
        make_face()
    extrude(amount=-MOUNT_DEPTH)

    # Эскиз3 → Бобышка-Вытянуть3 (add, symmetric)
    with BuildSketch(Plane.XY):
        Polygon((-27.2, 6.2), (-20.25, 6.2), (-20.25, 5.2), align=None)
        Polygon((20.25, 5.2), (27.2, 6.2), (20.25, 6.2), align=None)
    extrude(amount=EXTRUDE_3_DEPTH, both=True)

    # Эскиз4 → Бобышка-Вытянуть4 (add)
    with BuildSketch(Plane.XZ):
        with BuildLine():
            Line((-13.452560024, -8.92), (-13.452560024, -4.6))
            ThreePointArc((-13.452560024, -4.6), (-16.49296823, 0), (-13.452560024, 4.6))
            Line((-13.452560024, 4.6), (-13.452560024, 8.92))
            Line((-13.452560024, 8.92), (6.568139057, 8.92))
            ThreePointArc((6.568139057, 8.92), (19.9, 0), (6.568139057, -8.92))
            Line((6.568139057, -8.92), (-13.452560024, -8.92))
        make_face()
    extrude(amount=EXTRUDE_4_DEPTH)

    # Эскиз5 → Бобышка-Вытянуть5 (add)
    with BuildSketch(Plane.XZ.offset(2)):
        with BuildLine():
            Line((-13.452560024, 8.92), (-0.652560024, 8.92))
            Line((-0.652560024, 8.92), (-0.652560024, 2))
            ThreePointArc((-0.652560024, 2), (1.347439976, 0), (-0.652560024, -2))
            Line((-0.652560024, -2), (-0.652560024, -8.92))
            Line((-0.652560024, -8.92), (-13.452560024, -8.92))
            Line((-13.452560024, -8.92), (-13.452560024, 8.92))
        make_face()
        with Locations((-7.052560024, 0)):
            Rectangle(SKETCH_5_W, SKETCH_5_H, mode=Mode.SUBTRACT)
    extrude(amount=EXTRUDE_5_DEPTH)

    # Эскиз6 → Бобышка-Вытянуть6 (add)
    with BuildSketch(Plane.XZ.offset(2)):
        with Locations(Location((10.25, 0, 0), (0, 0, 270))):
            Circle(SKETCH_6_R)
    extrude(amount=EXTRUDE_6_DEPTH)

    # Эскиз7 → Бобышка-Вытянуть7 (add)
    with BuildSketch(Plane.XZ.offset(3.2)):
        with Locations(Location((10.25, 0, 0), (0, 0, 270))):
            Circle(SKETCH_7_R)
    extrude(amount=EXTRUDE_7_DEPTH)

    # Эскиз8 → Shaft hole (cut)
    with BuildSketch(Plane.XZ.offset(3.7)):
        with Locations(Location((10.25, 0, 0), (0, 0, 270))):
            Circle(SKETCH_8_R)
    extrude(amount=-SHAFT_HOLE_DEPTH, mode=Mode.SUBTRACT)

    # Скругление2
    fillet_2_edges = [part.edges().sort_by_distance(p)[0] for p in [
        (-13.452560024, -1.1, 8.92),
        (-0.652560024, -2.1, 2),
        (-0.652560024, -2.1, -2),
        (-0.652560024, -2.1, 8.92),
        (-0.652560024, -2.1, -8.92),
        (-13.452560024, -1.1, -8.92),
        (-1.652560024, -2.1, 7.92),
        (-1.652560024, -2.1, -7.92),
        (-12.452560024, -2.1, 7.92),
        (-12.452560024, -2.1, -7.92),
    ]]
    fillet(fillet_2_edges, radius=FILLET_2_R)

    # Эскиз10 → Rubber section 0
    with BuildSketch(Plane(origin=(25.25, 0, 0), x_dir=(0, 0, -1), z_dir=(1, 0, 0))):
        with BuildLine():
            Line((-2.5, 29.75), (2.5, 29.75))
            Line((2.5, 29.75), (2.5, 32.55))
            Line((2.5, 32.55), (-2.5, 32.55))
            Line((-2.5, 32.55), (-2.5, 29.75))
        make_face()
    # Эскиз9 → Rubber section 1
    with BuildSketch(Plane(origin=(20.25, 0, 0), x_dir=(0, 0, -1), z_dir=(1, 0, 0))):
        with BuildLine():
            Line((-3.4, 33.3), (3.4, 33.3))
            Line((3.4, 33.3), (3.4, 29))
            Line((3.4, 29), (-3.4, 29))
            Line((-3.4, 29), (-3.4, 33.3))
        make_face()
    loft()

    # Эскиз11 → Бобышка-Вытянуть10 (add)
    with BuildSketch(Plane(origin=(25.25, 0, 0), x_dir=(0, 0, -1), z_dir=(1, 0, 0))):
        with Locations(Location((0, 31.150503064, 0), (0, 0, 180))):
            Circle(SKETCH_11_R)
        with Locations(Location((1.509999917, 31.15000331, 0), (0, 0, 180))):
            Circle(SKETCH_11_R)
        with Locations(Location((-1.509999915, 31.149996646, 0), (0, 0, 180))):
            Circle(SKETCH_11_R)
    extrude(amount=EXTRUDE_10_DEPTH)


solid = part.part
